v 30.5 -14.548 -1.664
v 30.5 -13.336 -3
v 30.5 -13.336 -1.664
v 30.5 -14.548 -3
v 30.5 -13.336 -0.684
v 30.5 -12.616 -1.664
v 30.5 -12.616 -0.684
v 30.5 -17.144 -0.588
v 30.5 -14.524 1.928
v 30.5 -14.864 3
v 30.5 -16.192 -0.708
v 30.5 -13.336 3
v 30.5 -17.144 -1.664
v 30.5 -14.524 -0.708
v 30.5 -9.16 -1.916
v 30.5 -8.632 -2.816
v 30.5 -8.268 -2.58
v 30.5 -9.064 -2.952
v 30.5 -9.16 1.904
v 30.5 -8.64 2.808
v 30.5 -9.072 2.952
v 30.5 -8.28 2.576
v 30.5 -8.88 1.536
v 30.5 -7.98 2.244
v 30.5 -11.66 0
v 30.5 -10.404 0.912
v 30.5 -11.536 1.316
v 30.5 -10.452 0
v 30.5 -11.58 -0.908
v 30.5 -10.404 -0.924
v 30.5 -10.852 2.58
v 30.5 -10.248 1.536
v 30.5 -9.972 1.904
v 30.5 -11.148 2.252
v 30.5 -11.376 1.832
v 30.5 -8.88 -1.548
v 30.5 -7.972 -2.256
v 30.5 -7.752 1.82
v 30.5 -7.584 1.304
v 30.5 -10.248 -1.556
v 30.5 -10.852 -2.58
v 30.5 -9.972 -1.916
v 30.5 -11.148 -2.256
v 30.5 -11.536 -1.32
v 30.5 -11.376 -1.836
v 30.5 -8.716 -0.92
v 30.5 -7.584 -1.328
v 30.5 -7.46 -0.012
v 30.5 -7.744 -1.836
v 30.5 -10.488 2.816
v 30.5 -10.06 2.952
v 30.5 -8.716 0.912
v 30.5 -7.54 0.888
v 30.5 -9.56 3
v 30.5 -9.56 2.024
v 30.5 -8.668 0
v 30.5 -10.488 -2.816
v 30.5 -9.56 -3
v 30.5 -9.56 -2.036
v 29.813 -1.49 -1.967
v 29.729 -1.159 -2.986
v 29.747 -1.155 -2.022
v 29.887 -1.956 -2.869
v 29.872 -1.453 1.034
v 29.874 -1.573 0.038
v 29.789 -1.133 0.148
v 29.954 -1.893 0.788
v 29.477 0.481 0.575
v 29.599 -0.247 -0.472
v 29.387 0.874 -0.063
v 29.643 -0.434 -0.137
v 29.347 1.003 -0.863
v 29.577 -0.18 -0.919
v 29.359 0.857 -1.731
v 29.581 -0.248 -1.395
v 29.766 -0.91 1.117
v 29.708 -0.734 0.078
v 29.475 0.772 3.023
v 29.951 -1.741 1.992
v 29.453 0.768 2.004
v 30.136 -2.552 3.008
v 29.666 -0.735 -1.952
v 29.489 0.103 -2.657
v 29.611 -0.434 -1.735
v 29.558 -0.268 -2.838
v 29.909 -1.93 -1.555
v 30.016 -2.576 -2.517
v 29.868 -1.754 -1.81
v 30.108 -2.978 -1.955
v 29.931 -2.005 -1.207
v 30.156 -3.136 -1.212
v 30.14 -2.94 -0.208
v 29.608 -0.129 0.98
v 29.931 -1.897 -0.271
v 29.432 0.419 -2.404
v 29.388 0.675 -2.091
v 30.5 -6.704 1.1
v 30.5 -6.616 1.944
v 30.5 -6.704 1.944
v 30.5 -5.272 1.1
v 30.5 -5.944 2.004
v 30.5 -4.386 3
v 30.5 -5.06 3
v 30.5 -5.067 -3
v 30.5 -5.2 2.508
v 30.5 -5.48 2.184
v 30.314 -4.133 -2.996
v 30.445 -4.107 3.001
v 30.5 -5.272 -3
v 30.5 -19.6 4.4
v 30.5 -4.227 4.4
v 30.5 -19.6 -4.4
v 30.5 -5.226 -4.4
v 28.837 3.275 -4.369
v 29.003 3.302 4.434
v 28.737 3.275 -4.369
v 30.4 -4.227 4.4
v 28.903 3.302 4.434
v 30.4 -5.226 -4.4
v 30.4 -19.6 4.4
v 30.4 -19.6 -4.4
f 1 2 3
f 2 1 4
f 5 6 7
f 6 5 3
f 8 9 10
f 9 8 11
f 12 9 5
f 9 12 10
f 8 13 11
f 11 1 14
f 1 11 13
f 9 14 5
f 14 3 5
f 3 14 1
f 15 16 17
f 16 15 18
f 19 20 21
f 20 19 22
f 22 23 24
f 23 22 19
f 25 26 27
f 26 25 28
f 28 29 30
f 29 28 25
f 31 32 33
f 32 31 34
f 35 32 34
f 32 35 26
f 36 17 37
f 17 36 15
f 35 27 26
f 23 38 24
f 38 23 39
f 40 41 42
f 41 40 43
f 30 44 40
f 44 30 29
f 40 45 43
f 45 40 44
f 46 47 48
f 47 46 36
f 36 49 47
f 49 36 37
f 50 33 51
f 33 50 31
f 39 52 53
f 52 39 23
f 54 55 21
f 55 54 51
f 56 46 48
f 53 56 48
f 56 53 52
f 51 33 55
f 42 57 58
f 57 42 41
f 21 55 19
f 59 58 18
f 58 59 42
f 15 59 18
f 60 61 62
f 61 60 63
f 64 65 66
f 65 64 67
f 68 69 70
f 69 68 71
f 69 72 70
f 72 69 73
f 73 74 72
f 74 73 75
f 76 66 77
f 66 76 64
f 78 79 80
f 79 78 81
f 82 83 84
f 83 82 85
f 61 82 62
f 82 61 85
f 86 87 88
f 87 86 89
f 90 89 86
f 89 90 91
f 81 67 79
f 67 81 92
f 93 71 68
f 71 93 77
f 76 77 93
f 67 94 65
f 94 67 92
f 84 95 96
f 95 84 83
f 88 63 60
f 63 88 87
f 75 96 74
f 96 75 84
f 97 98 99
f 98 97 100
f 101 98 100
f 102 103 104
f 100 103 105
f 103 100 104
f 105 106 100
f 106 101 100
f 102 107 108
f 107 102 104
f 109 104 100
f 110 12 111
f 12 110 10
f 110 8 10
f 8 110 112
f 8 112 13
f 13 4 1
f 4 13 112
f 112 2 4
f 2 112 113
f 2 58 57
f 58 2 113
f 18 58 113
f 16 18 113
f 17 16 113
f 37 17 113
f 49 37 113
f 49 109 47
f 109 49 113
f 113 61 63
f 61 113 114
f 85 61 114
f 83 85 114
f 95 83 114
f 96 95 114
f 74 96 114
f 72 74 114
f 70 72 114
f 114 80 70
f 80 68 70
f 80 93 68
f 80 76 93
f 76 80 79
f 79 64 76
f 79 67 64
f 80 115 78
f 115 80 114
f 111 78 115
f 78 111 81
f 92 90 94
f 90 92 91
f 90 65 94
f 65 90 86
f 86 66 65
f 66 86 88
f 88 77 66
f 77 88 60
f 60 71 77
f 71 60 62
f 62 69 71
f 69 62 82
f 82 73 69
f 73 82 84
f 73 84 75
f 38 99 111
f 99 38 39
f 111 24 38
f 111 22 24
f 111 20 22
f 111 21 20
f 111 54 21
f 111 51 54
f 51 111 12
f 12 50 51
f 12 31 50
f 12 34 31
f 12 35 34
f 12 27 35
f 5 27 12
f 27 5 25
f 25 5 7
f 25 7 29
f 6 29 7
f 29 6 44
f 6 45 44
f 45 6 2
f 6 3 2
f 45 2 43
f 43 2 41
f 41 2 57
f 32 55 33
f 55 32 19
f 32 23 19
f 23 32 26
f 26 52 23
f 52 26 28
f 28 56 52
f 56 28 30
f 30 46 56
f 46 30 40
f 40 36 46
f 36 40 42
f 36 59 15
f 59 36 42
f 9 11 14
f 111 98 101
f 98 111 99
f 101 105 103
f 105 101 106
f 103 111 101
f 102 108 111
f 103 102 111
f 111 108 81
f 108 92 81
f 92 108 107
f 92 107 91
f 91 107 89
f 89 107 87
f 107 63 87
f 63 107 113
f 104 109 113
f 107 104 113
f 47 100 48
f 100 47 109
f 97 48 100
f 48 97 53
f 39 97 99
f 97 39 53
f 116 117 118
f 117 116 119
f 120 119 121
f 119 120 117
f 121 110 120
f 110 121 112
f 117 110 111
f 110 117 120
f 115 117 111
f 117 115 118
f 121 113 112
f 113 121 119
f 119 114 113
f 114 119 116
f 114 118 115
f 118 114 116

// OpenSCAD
use <../lib.scad>
function ldraw_lib__194295bc01() = [
// 0 Sticker  1.1 x  2.9 with White "4015" on Transparent Background (Formed for Boat Stern Left Side)
// 0 Name: 194295bc01.dat
// 0 Author: Takeshi Takahashi [RainbowDolphin]
// 0 !LDRAW_ORG Part UPDATE 2024-04
// 0 !LICENSE Licensed under CC BY 4.0 : see CAreadme.txt
// 
// 0 BFC CERTIFY CCW
  [0,"BFC","CERTIFY"],
  [0,"BFC","CCW"],
// 
// 0 !KEYWORDS Bricklink 4015stk01, Brickowl 526213, Freighter, Rebrickable 194295
// 0 !KEYWORDS Set 4015
// 
// 0 !HISTORY 2024-05-28 [OrionP] Official Update 2024-04
// 
// 
// 0 BFC NOCLIP
  [0,"BFC","NOCLIP"],
// 4 15 76.25 7.5 -36.37 76.25 7.5 -33.34 76.25 4.16 -33.34 76.25 4.16 -36.37
  [4,15,76.25,7.5,-36.37,76.25,7.5,-33.34,76.25,4.16,-33.34,76.25,4.16,-36.37],
// 4 15 76.25 1.71 -33.34 76.25 4.16 -33.34 76.25 4.16 -31.54 76.25 1.71 -31.54
  [4,15,76.25,1.71,-33.34,76.25,4.16,-33.34,76.25,4.16,-31.54,76.25,1.71,-31.54],
// 4 15 76.25 1.77 -40.48 76.25 -4.82 -36.309 76.25 -7.5 -37.16 76.25 1.47 -42.86
  [4,15,76.25,1.77,-40.48,76.25,-4.82,-36.309,76.25,-7.5,-37.16,76.25,1.47,-42.86],
// 4 15 76.25 -7.5 -33.34 76.25 -7.5 -37.16 76.25 -4.82 -36.309 76.25 1.71 -33.34
  [4,15,76.25,-7.5,-33.34,76.25,-7.5,-37.16,76.25,-4.82,-36.309,76.25,1.71,-33.34],
// 3 15 76.25 1.47 -42.86 76.25 4.16 -42.86 76.25 1.77 -40.48
  [3,15,76.25,1.47,-42.86,76.25,4.16,-42.86,76.25,1.77,-40.48],
// 4 15 76.25 1.77 -36.309 76.25 1.77 -40.48 76.25 4.16 -42.86 76.25 4.16 -36.37
  [4,15,76.25,1.77,-36.309,76.25,1.77,-40.48,76.25,4.16,-42.86,76.25,4.16,-36.37],
// 3 15 76.25 -4.82 -36.309 76.25 1.77 -36.309 76.25 1.71 -33.34
  [3,15,76.25,-4.82,-36.309,76.25,1.77,-36.309,76.25,1.71,-33.34],
// 4 15 76.25 4.16 -36.37 76.25 4.16 -33.34 76.25 1.71 -33.34 76.25 1.77 -36.309
  [4,15,76.25,4.16,-36.37,76.25,4.16,-33.34,76.25,1.71,-33.34,76.25,1.77,-36.309],
// 4 15 76.25 6.45 -20.67 76.25 4.79 -22.9 76.25 7.38 -22.66 76.25 7.04 -21.58
  [4,15,76.25,6.45,-20.67,76.25,4.79,-22.9,76.25,7.38,-22.66,76.25,7.04,-21.58],
// 4 15 76.25 -7.38 -22.68 76.25 -4.76 -22.9 76.25 -6.44 -20.7 76.25 -7.02 -21.6
  [4,15,76.25,-7.38,-22.68,76.25,-4.76,-22.9,76.25,-6.44,-20.7,76.25,-7.02,-21.6],
// 4 15 76.25 -5.61 -19.95 76.25 -6.44 -20.7 76.25 -4.76 -22.9 76.25 -3.84 -22.2
  [4,15,76.25,-5.61,-19.95,76.25,-6.44,-20.7,76.25,-4.76,-22.9,76.25,-3.84,-22.2],
// 4 15 76.25 -3.29 -28.84 76.25 0 -29.15 76.25 0 -26.13 76.25 -2.28 -26.01
  [4,15,76.25,-3.29,-28.84,76.25,0,-29.15,76.25,0,-26.13,76.25,-2.28,-26.01],
// 4 15 76.25 0 -29.15 76.25 2.27 -28.95 76.25 2.31 -26.01 76.25 0 -26.13
  [4,15,76.25,0,-29.15,76.25,2.27,-28.95,76.25,2.31,-26.01,76.25,0,-26.13],
// 4 15 76.25 -4.76 -24.93 76.25 -6.45 -27.13 76.25 -5.63 -27.87 76.25 -3.84 -25.62
  [4,15,76.25,-4.76,-24.93,76.25,-6.45,-27.13,76.25,-5.63,-27.87,76.25,-3.84,-25.62],
// 4 15 76.25 -3.84 -25.62 76.25 -5.63 -27.87 76.25 -4.58 -28.44 76.25 -2.28 -26.01
  [4,15,76.25,-3.84,-25.62,76.25,-5.63,-27.87,76.25,-4.58,-28.44,76.25,-2.28,-26.01],
// 4 15 76.25 4.79 -22.9 76.25 6.45 -20.67 76.25 5.64 -19.93 76.25 3.87 -22.2
  [4,15,76.25,4.79,-22.9,76.25,6.45,-20.67,76.25,5.64,-19.93,76.25,3.87,-22.2],
// 3 15 76.25 -4.58 -28.44 76.25 -3.29 -28.84 76.25 -2.28 -26.01
  [3,15,76.25,-4.58,-28.44,76.25,-3.29,-28.84,76.25,-2.28,-26.01],
// 4 15 76.25 -3.26 -18.96 76.25 -4.55 -19.38 76.25 -5.61 -19.95 76.25 -3.84 -22.2
  [4,15,76.25,-3.26,-18.96,76.25,-4.55,-19.38,76.25,-5.61,-19.95,76.25,-3.84,-22.2],
// 4 15 76.25 4.79 -24.93 76.25 3.89 -25.62 76.25 5.64 -27.87 76.25 6.45 -27.13
  [4,15,76.25,4.79,-24.93,76.25,3.89,-25.62,76.25,5.64,-27.87,76.25,6.45,-27.13],
// 4 15 76.25 2.27 -28.95 76.25 3.3 -28.84 76.25 3.89 -25.62 76.25 2.31 -26.01
  [4,15,76.25,2.27,-28.95,76.25,3.3,-28.84,76.25,3.89,-25.62,76.25,2.31,-26.01],
// 4 15 76.25 3.3 -28.84 76.25 4.59 -28.44 76.25 5.64 -27.87 76.25 3.89 -25.62
  [4,15,76.25,3.3,-28.84,76.25,4.59,-28.44,76.25,5.64,-27.87,76.25,3.89,-25.62],
// 4 15 76.25 .03 -18.65 76.25 2.3 -21.79 76.25 3.87 -22.2 76.25 3.32 -18.96
  [4,15,76.25,.03,-18.65,76.25,2.3,-21.79,76.25,3.87,-22.2,76.25,3.32,-18.96],
// 4 15 76.25 5.64 -19.93 76.25 4.59 -19.36 76.25 3.32 -18.96 76.25 3.87 -22.2
  [4,15,76.25,5.64,-19.93,76.25,4.59,-19.36,76.25,3.32,-18.96,76.25,3.87,-22.2],
// 4 15 76.25 -6.45 -27.13 76.25 -4.76 -24.93 76.25 -7.38 -25.15 76.25 -7.04 -26.22
  [4,15,76.25,-6.45,-27.13,76.25,-4.76,-24.93,76.25,-7.38,-25.15,76.25,-7.04,-26.22],
// 4 15 76.25 -3.84 -22.2 76.25 -2.28 -21.79 76.25 -2.22 -18.85 76.25 -3.26 -18.96
  [4,15,76.25,-3.84,-22.2,76.25,-2.28,-21.79,76.25,-2.22,-18.85,76.25,-3.26,-18.96],
// 4 15 76.25 -7.38 -22.68 76.25 -7.5 -23.9 76.25 -7.38 -25.15 76.25 -5.06 -23.9
  [4,15,76.25,-7.38,-22.68,76.25,-7.5,-23.9,76.25,-7.38,-25.15,76.25,-5.06,-23.9],
// 3 15 76.25 0 -21.67 76.25 2.3 -21.79 76.25 .03 -18.65
  [3,15,76.25,0,-21.67,76.25,2.3,-21.79,76.25,.03,-18.65],
// 4 15 76.25 -2.28 -21.79 76.25 0 -21.67 76.25 .03 -18.65 76.25 -2.22 -18.85
  [4,15,76.25,-2.28,-21.79,76.25,0,-21.67,76.25,.03,-18.65,76.25,-2.22,-18.85],
// 3 15 76.25 -7.38 -25.15 76.25 -4.76 -24.93 76.25 -5.06 -23.9
  [3,15,76.25,-7.38,-25.15,76.25,-4.76,-24.93,76.25,-5.06,-23.9],
// 4 15 76.25 6.45 -27.13 76.25 7.04 -26.22 76.25 7.5 -23.9 76.25 4.79 -24.93
  [4,15,76.25,6.45,-27.13,76.25,7.04,-26.22,76.25,7.5,-23.9,76.25,4.79,-24.93],
// 3 15 76.25 -7.38 -22.68 76.25 -5.06 -23.9 76.25 -4.76 -22.9
  [3,15,76.25,-7.38,-22.68,76.25,-5.06,-23.9,76.25,-4.76,-22.9],
// 4 15 76.25 4.79 -24.93 76.25 7.5 -23.9 76.25 7.38 -22.66 76.25 5.09 -23.9
  [4,15,76.25,4.79,-24.93,76.25,7.5,-23.9,76.25,7.38,-22.66,76.25,5.09,-23.9],
// 3 15 76.25 4.79 -22.9 76.25 5.09 -23.9 76.25 7.38 -22.66
  [3,15,76.25,4.79,-22.9,76.25,5.09,-23.9,76.25,7.38,-22.66],
// 4 15 74.7179 7.1715 -4.8893 74.3232 7.4641 -2.8964 74.3664 5.0549 -2.888 74.5325 4.918 -3.7255
  [4,15,74.7179,7.1715,-4.8893,74.3232,7.4641,-2.8964,74.3664,5.0549,-2.888,74.5325,4.918,-3.7255],
// 4 15 74.8855 -1.9708 -4.7314 74.6842 -.0954 -3.9324 74.4719 -.3702 -2.8336 74.6807 -2.5854 -3.6321
  [4,15,74.8855,-1.9708,-4.7314,74.6842,-.0954,-3.9324,74.4719,-.3702,-2.8336,74.6807,-2.5854,-3.6321],
// 4 15 74.1083 .3416 -1.0859 73.9964 1.1791 -.6182 73.4663 .1582 2.1862 73.6936 -1.4377 1.2016
  [4,15,74.1083,.3416,-1.0859,73.9964,1.1791,-.6182,73.4663,.1582,2.1862,73.6936,-1.4377,1.2016],
// 4 15 73.4663 .1582 2.1862 73.9964 1.1791 -.6182 73.9416 2.297 -.4509 73.3665 2.1563 2.5067
  [4,15,73.4663,.1582,2.1862,73.9964,1.1791,-.6182,73.9416,2.297,-.4509,73.3665,2.1563,2.5067],
// 4 15 73.9523 3.4872 -.6188 73.3972 4.3269 2.1427 73.3665 2.1563 2.5067 73.9416 2.297 -.4509
  [4,15,73.9523,3.4872,-.6188,73.3972,4.3269,2.1427,73.3665,2.1563,2.5067,73.9416,2.297,-.4509],
// 4 15 74.6807 -2.5854 -3.6321 74.4719 -.3702 -2.8336 74.2691 -.1947 -1.8339 74.4155 -2.7914 -2.2748
  [4,15,74.6807,-2.5854,-3.6321,74.4719,-.3702,-2.8336,74.2691,-.1947,-1.8339,74.4155,-2.7914,-2.2748],
// 4 15 75.3389 -7.5206 -6.3812 74.8781 -4.981 -4.3528 73.6315 -5.0091 1.9193 73.6869 -7.5579 1.9303
  [4,15,75.3389,-7.5206,-6.3812,74.8781,-4.981,-4.3528,73.6315,-5.0091,1.9193,73.6869,-7.5579,1.9303],
// 4 15 73.7226 6.6429 .2563 74.0273 4.3386 -1.0842 74.1644 4.8812 -1.8374 73.8951 7.0962 -.67
  [4,15,73.7226,6.6429,.2563,74.0273,4.3386,-1.0842,74.1644,4.8812,-1.8374,73.8951,7.0962,-.67],
// 4 15 74.3664 5.0549 -2.888 74.3232 7.4641 -2.8964 73.8951 7.0962 -.67 74.1644 4.8812 -1.8374
  [4,15,74.3664,5.0549,-2.888,74.3232,7.4641,-2.8964,73.8951,7.0962,-.67,74.1644,4.8812,-1.8374],
// 4 15 74.6698 4.5243 -4.3843 74.7716 3.8866 -4.824 75.2702 4.8879 -7.4448 75.0388 6.2927 -6.4409
  [4,15,74.6698,4.5243,-4.3843,74.7716,3.8866,-4.824,75.2702,4.8879,-7.4448,75.0388,6.2927,-6.4409],
// 4 15 75.3909 3.0306 -7.8408 75.2702 4.8879 -7.4448 74.7716 3.8866 -4.824 74.8287 3.0179 -5.0126
  [4,15,75.3909,3.0306,-7.8408,75.2702,4.8879,-7.4448,74.7716,3.8866,-4.824,74.8287,3.0179,-5.0126],
// 4 15 74.8781 -4.981 -4.3528 75.3389 -7.5206 -6.3812 75.3498 .5197 -7.349 74.8855 -1.9708 -4.7314
  [4,15,74.8781,-4.981,-4.3528,75.3389,-7.5206,-6.3812,75.3498,.5197,-7.349,74.8855,-1.9708,-4.7314],
// 4 15 73.6936 -1.4377 1.2016 74.0197 -2.4504 -.3235 74.2691 -.1947 -1.8339 74.1083 .3416 -1.0859
  [4,15,73.6936,-1.4377,1.2016,74.0197,-2.4504,-.3235,74.2691,-.1947,-1.8339,74.1083,.3416,-1.0859],
// 3 15 74.4155 -2.7914 -2.2748 74.2691 -.1947 -1.8339 74.0197 -2.4504 -.3235
  [3,15,74.4155,-2.7914,-2.2748,74.2691,-.1947,-1.8339,74.0197,-2.4504,-.3235],
// 4 15 75.3498 .5197 -7.349 74.8279 .6779 -4.7428 74.6842 -.0954 -3.9324 74.8855 -1.9708 -4.7314
  [4,15,75.3498,.5197,-7.349,74.8279,.6779,-4.7428,74.6842,-.0954,-3.9324,74.8855,-1.9708,-4.7314],
// 4 15 73.4695 5.2282 1.6868 74.0273 4.3386 -1.0842 73.7226 6.6429 .2563 73.5796 6.0103 1.0484
  [4,15,73.4695,5.2282,1.6868,74.0273,4.3386,-1.0842,73.7226,6.6429,.2563,73.5796,6.0103,1.0484],
// 4 15 75.0388 6.2927 -6.4409 74.7179 7.1715 -4.8893 74.5325 4.918 -3.7255 74.6698 4.5243 -4.3843
  [4,15,75.0388,6.2927,-6.4409,74.7179,7.1715,-4.8893,74.5325,4.918,-3.7255,74.6698,4.5243,-4.3843],
// 4 15 73.3972 4.3269 2.1427 73.9523 3.4872 -.6188 74.0273 4.3386 -1.0842 73.4695 5.2282 1.6868
  [4,15,73.3972,4.3269,2.1427,73.9523,3.4872,-.6188,74.0273,4.3386,-1.0842,73.4695,5.2282,1.6868],
// 4 15 76.25 -4.86 -16.54 76.25 -4.86 -16.76 76.25 -2.75 -16.76 76.25 -2.75 -13.18
  [4,15,76.25,-4.86,-16.54,76.25,-4.86,-16.76,76.25,-2.75,-16.76,76.25,-2.75,-13.18],
// 3 15 76.25 -5.01 -14.86 76.25 -4.86 -16.54 76.25 -2.75 -13.18
  [3,15,76.25,-5.01,-14.86,76.25,-4.86,-16.54,76.25,-2.75,-13.18],
// 3 15 76.25 -7.5 -10.9652 76.25 -7.5 -12.65 76.25 7.5 -12.6684
  [3,15,76.25,-7.5,-10.9652,76.25,-7.5,-12.65,76.25,7.5,-12.6684],
// 4 15 76.25 -7.5 -12.65 76.25 -6.27 -13 76.25 -2.75 -13.18 76.25 7.5 -12.6684
  [4,15,76.25,-7.5,-12.65,76.25,-6.27,-13,76.25,-2.75,-13.18,76.25,7.5,-12.6684],
// 3 15 76.25 -6.27 -13 76.25 -5.46 -13.7 76.25 -2.75 -13.18
  [3,15,76.25,-6.27,-13,76.25,-5.46,-13.7,76.25,-2.75,-13.18],
// 3 15 76.25 -5.46 -13.7 76.25 -5.01 -14.86 76.25 -2.75 -13.18
  [3,15,76.25,-5.46,-13.7,76.25,-5.01,-14.86,76.25,-2.75,-13.18],
// 4 15 76.1113 -7.5031 -10.2676 76.25 -7.5 -10.9652 76.25 7.5 -12.6684 75.7857 7.4895 -10.3323
  [4,15,76.1113,-7.5031,-10.2676,76.25,-7.5,-10.9652,76.25,7.5,-12.6684,75.7857,7.4895,-10.3323],
// 3 15 76.25 7.5 -13.18 76.25 7.5 -12.6684 76.25 -2.75 -13.18
  [3,15,76.25,7.5,-13.18,76.25,7.5,-12.6684,76.25,-2.75,-13.18],
// 0 BFC CLIP
  [0,"BFC","CLIP"],
// 4 16 76.25 -7.5 -33.34 76.25 -11 -10.5677 76.25 -11 -49 76.25 -7.5 -37.16
  [4,16,76.25,-7.5,-33.34,76.25,-11,-10.5677,76.25,-11,-49,76.25,-7.5,-37.16],
// 4 16 76.25 1.47 -42.86 76.25 -7.5 -37.16 76.25 -11 -49 76.25 11 -49
  [4,16,76.25,1.47,-42.86,76.25,-7.5,-37.16,76.25,-11,-49,76.25,11,-49],
// 3 16 76.25 1.47 -42.86 76.25 11 -49 76.25 4.16 -42.86
  [3,16,76.25,1.47,-42.86,76.25,11,-49,76.25,4.16,-42.86],
// 4 16 76.25 4.16 -36.37 76.25 4.16 -42.86 76.25 11 -49 76.25 7.5 -36.37
  [4,16,76.25,4.16,-36.37,76.25,4.16,-42.86,76.25,11,-49,76.25,7.5,-36.37],
// 4 16 76.25 7.5 -33.34 76.25 7.5 -36.37 76.25 11 -49 76.25 11 -13.0658
  [4,16,76.25,7.5,-33.34,76.25,7.5,-36.37,76.25,11,-49,76.25,11,-13.0658],
// 4 16 76.25 7.5 -33.34 76.25 11 -13.0658 76.25 7.5 -23.9 76.25 7.04 -26.22
  [4,16,76.25,7.5,-33.34,76.25,11,-13.0658,76.25,7.5,-23.9,76.25,7.04,-26.22],
// 3 16 76.25 7.38 -22.66 76.25 7.5 -23.9 76.25 11 -13.0658
  [3,16,76.25,7.38,-22.66,76.25,7.5,-23.9,76.25,11,-13.0658],
// 3 16 76.25 7.04 -21.58 76.25 7.38 -22.66 76.25 11 -13.0658
  [3,16,76.25,7.04,-21.58,76.25,7.38,-22.66,76.25,11,-13.0658],
// 3 16 76.25 6.45 -20.67 76.25 7.04 -21.58 76.25 11 -13.0658
  [3,16,76.25,6.45,-20.67,76.25,7.04,-21.58,76.25,11,-13.0658],
// 3 16 76.25 5.64 -19.93 76.25 6.45 -20.67 76.25 11 -13.0658
  [3,16,76.25,5.64,-19.93,76.25,6.45,-20.67,76.25,11,-13.0658],
// 3 16 76.25 4.59 -19.36 76.25 5.64 -19.93 76.25 11 -13.0658
  [3,16,76.25,4.59,-19.36,76.25,5.64,-19.93,76.25,11,-13.0658],
// 4 16 76.25 3.32 -18.96 76.25 4.59 -19.36 76.25 11 -13.0658 76.25 7.5 -13.18
  [4,16,76.25,3.32,-18.96,76.25,4.59,-19.36,76.25,11,-13.0658,76.25,7.5,-13.18],
// 4 16 74.3232 7.4641 -2.8964 74.7179 7.1715 -4.8893 76.25 11 -13.0658 72.0935 10.9226 8.188
  [4,16,74.3232,7.4641,-2.8964,74.7179,7.1715,-4.8893,76.25,11,-13.0658,72.0935,10.9226,8.188],
// 3 16 73.8951 7.0962 -.67 74.3232 7.4641 -2.8964 72.0935 10.9226 8.188
  [3,16,73.8951,7.0962,-.67,74.3232,7.4641,-2.8964,72.0935,10.9226,8.188],
// 3 16 73.7226 6.6429 .2563 73.8951 7.0962 -.67 72.0935 10.9226 8.188
  [3,16,73.7226,6.6429,.2563,73.8951,7.0962,-.67,72.0935,10.9226,8.188],
// 3 16 73.5796 6.0103 1.0484 73.7226 6.6429 .2563 72.0935 10.9226 8.188
  [3,16,73.5796,6.0103,1.0484,73.7226,6.6429,.2563,72.0935,10.9226,8.188],
// 3 16 73.4695 5.2282 1.6868 73.5796 6.0103 1.0484 72.0935 10.9226 8.188
  [3,16,73.4695,5.2282,1.6868,73.5796,6.0103,1.0484,72.0935,10.9226,8.188],
// 3 16 73.3972 4.3269 2.1427 73.4695 5.2282 1.6868 72.0935 10.9226 8.188
  [3,16,73.3972,4.3269,2.1427,73.4695,5.2282,1.6868,72.0935,10.9226,8.188],
// 3 16 73.3665 2.1563 2.5067 73.3972 4.3269 2.1427 72.0935 10.9226 8.188
  [3,16,73.3665,2.1563,2.5067,73.3972,4.3269,2.1427,72.0935,10.9226,8.188],
// 3 16 73.4663 .1582 2.1862 73.3665 2.1563 2.5067 72.0935 10.9226 8.188
  [3,16,73.4663,.1582,2.1862,73.3665,2.1563,2.5067,72.0935,10.9226,8.188],
// 3 16 72.0935 10.9226 8.188 73.6315 -5.0091 1.9193 73.4663 .1582 2.1862
  [3,16,72.0935,10.9226,8.188,73.6315,-5.0091,1.9193,73.4663,.1582,2.1862],
// 3 16 73.6315 -5.0091 1.9193 73.6936 -1.4377 1.2016 73.4663 .1582 2.1862
  [3,16,73.6315,-5.0091,1.9193,73.6936,-1.4377,1.2016,73.4663,.1582,2.1862],
// 3 16 73.6315 -5.0091 1.9193 74.0197 -2.4504 -.3235 73.6936 -1.4377 1.2016
  [3,16,73.6315,-5.0091,1.9193,74.0197,-2.4504,-.3235,73.6936,-1.4377,1.2016],
// 4 16 74.4155 -2.7914 -2.2748 74.0197 -2.4504 -.3235 73.6315 -5.0091 1.9193 74.8781 -4.981 -4.3528
  [4,16,74.4155,-2.7914,-2.2748,74.0197,-2.4504,-.3235,73.6315,-5.0091,1.9193,74.8781,-4.981,-4.3528],
// 3 16 74.8781 -4.981 -4.3528 74.6807 -2.5854 -3.6321 74.4155 -2.7914 -2.2748
  [3,16,74.8781,-4.981,-4.3528,74.6807,-2.5854,-3.6321,74.4155,-2.7914,-2.2748],
// 3 16 74.8781 -4.981 -4.3528 74.8855 -1.9708 -4.7314 74.6807 -2.5854 -3.6321
  [3,16,74.8781,-4.981,-4.3528,74.8855,-1.9708,-4.7314,74.6807,-2.5854,-3.6321],
// 4 16 73.6315 -5.0091 1.9193 72.0935 10.9226 8.188 72.5085 -11.0845 8.256 73.6869 -7.5579 1.9303
  [4,16,73.6315,-5.0091,1.9193,72.0935,10.9226,8.188,72.5085,-11.0845,8.256,73.6869,-7.5579,1.9303],
// 4 16 75.3389 -7.5206 -6.3812 73.6869 -7.5579 1.9303 72.5085 -11.0845 8.256 76.25 -11 -10.5677
  [4,16,75.3389,-7.5206,-6.3812,73.6869,-7.5579,1.9303,72.5085,-11.0845,8.256,76.25,-11,-10.5677],
// 4 16 74.8279 .6779 -4.7428 75.3498 .5197 -7.349 75.3909 3.0306 -7.8408 74.8287 3.0179 -5.0126
  [4,16,74.8279,.6779,-4.7428,75.3498,.5197,-7.349,75.3909,3.0306,-7.8408,74.8287,3.0179,-5.0126],
// 4 16 74.6842 -.0954 -3.9324 74.8279 .6779 -4.7428 74.8287 3.0179 -5.0126 74.7716 3.8866 -4.824
  [4,16,74.6842,-.0954,-3.9324,74.8279,.6779,-4.7428,74.8287,3.0179,-5.0126,74.7716,3.8866,-4.824],
// 4 16 74.4719 -.3702 -2.8336 74.6842 -.0954 -3.9324 74.7716 3.8866 -4.824 74.6698 4.5243 -4.3843
  [4,16,74.4719,-.3702,-2.8336,74.6842,-.0954,-3.9324,74.7716,3.8866,-4.824,74.6698,4.5243,-4.3843],
// 4 16 74.2691 -.1947 -1.8339 74.4719 -.3702 -2.8336 74.6698 4.5243 -4.3843 74.5325 4.918 -3.7255
  [4,16,74.2691,-.1947,-1.8339,74.4719,-.3702,-2.8336,74.6698,4.5243,-4.3843,74.5325,4.918,-3.7255],
// 4 16 74.1083 .3416 -1.0859 74.2691 -.1947 -1.8339 74.5325 4.918 -3.7255 74.3664 5.0549 -2.888
  [4,16,74.1083,.3416,-1.0859,74.2691,-.1947,-1.8339,74.5325,4.918,-3.7255,74.3664,5.0549,-2.888],
// 4 16 73.9964 1.1791 -.6182 74.1083 .3416 -1.0859 74.3664 5.0549 -2.888 74.1644 4.8812 -1.8374
  [4,16,73.9964,1.1791,-.6182,74.1083,.3416,-1.0859,74.3664,5.0549,-2.888,74.1644,4.8812,-1.8374],
// 4 16 73.9416 2.297 -.4509 73.9964 1.1791 -.6182 74.1644 4.8812 -1.8374 74.0273 4.3386 -1.0842
  [4,16,73.9416,2.297,-.4509,73.9964,1.1791,-.6182,74.1644,4.8812,-1.8374,74.0273,4.3386,-1.0842],
// 3 16 73.9416 2.297 -.4509 74.0273 4.3386 -1.0842 73.9523 3.4872 -.6188
  [3,16,73.9416,2.297,-.4509,74.0273,4.3386,-1.0842,73.9523,3.4872,-.6188],
// 4 16 76.25 -11 -10.5677 76.25 -4.55 -19.38 76.25 -3.26 -18.96 76.25 -4.86 -16.76
  [4,16,76.25,-11,-10.5677,76.25,-4.55,-19.38,76.25,-3.26,-18.96,76.25,-4.86,-16.76],
// 3 16 76.25 -11 -10.5677 76.25 -5.61 -19.95 76.25 -4.55 -19.38
  [3,16,76.25,-11,-10.5677,76.25,-5.61,-19.95,76.25,-4.55,-19.38],
// 3 16 76.25 -11 -10.5677 76.25 -6.44 -20.7 76.25 -5.61 -19.95
  [3,16,76.25,-11,-10.5677,76.25,-6.44,-20.7,76.25,-5.61,-19.95],
// 3 16 76.25 -11 -10.5677 76.25 -7.02 -21.6 76.25 -6.44 -20.7
  [3,16,76.25,-11,-10.5677,76.25,-7.02,-21.6,76.25,-6.44,-20.7],
// 3 16 76.25 -11 -10.5677 76.25 -7.38 -22.68 76.25 -7.02 -21.6
  [3,16,76.25,-11,-10.5677,76.25,-7.38,-22.68,76.25,-7.02,-21.6],
// 3 16 76.25 -11 -10.5677 76.25 -7.5 -23.9 76.25 -7.38 -22.68
  [3,16,76.25,-11,-10.5677,76.25,-7.5,-23.9,76.25,-7.38,-22.68],
// 4 16 76.25 -7.38 -25.15 76.25 -7.5 -23.9 76.25 -11 -10.5677 76.25 -7.5 -33.34
  [4,16,76.25,-7.38,-25.15,76.25,-7.5,-23.9,76.25,-11,-10.5677,76.25,-7.5,-33.34],
// 3 16 76.25 -7.5 -33.34 76.25 -7.04 -26.22 76.25 -7.38 -25.15
  [3,16,76.25,-7.5,-33.34,76.25,-7.04,-26.22,76.25,-7.38,-25.15],
// 3 16 76.25 -7.5 -33.34 76.25 -6.45 -27.13 76.25 -7.04 -26.22
  [3,16,76.25,-7.5,-33.34,76.25,-6.45,-27.13,76.25,-7.04,-26.22],
// 3 16 76.25 -7.5 -33.34 76.25 -5.63 -27.87 76.25 -6.45 -27.13
  [3,16,76.25,-7.5,-33.34,76.25,-5.63,-27.87,76.25,-6.45,-27.13],
// 3 16 76.25 -7.5 -33.34 76.25 -4.58 -28.44 76.25 -5.63 -27.87
  [3,16,76.25,-7.5,-33.34,76.25,-4.58,-28.44,76.25,-5.63,-27.87],
// 3 16 76.25 -7.5 -33.34 76.25 -3.29 -28.84 76.25 -4.58 -28.44
  [3,16,76.25,-7.5,-33.34,76.25,-3.29,-28.84,76.25,-4.58,-28.44],
// 4 16 76.25 0 -29.15 76.25 -3.29 -28.84 76.25 -7.5 -33.34 76.25 1.71 -33.34
  [4,16,76.25,0,-29.15,76.25,-3.29,-28.84,76.25,-7.5,-33.34,76.25,1.71,-33.34],
// 3 16 76.25 0 -29.15 76.25 1.71 -33.34 76.25 1.71 -31.54
  [3,16,76.25,0,-29.15,76.25,1.71,-33.34,76.25,1.71,-31.54],
// 3 16 76.25 0 -29.15 76.25 1.71 -31.54 76.25 2.27 -28.95
  [3,16,76.25,0,-29.15,76.25,1.71,-31.54,76.25,2.27,-28.95],
// 4 16 76.25 3.3 -28.84 76.25 2.27 -28.95 76.25 1.71 -31.54 76.25 4.16 -31.54
  [4,16,76.25,3.3,-28.84,76.25,2.27,-28.95,76.25,1.71,-31.54,76.25,4.16,-31.54],
// 4 16 76.25 4.59 -28.44 76.25 3.3 -28.84 76.25 4.16 -31.54 76.25 7.5 -33.34
  [4,16,76.25,4.59,-28.44,76.25,3.3,-28.84,76.25,4.16,-31.54,76.25,7.5,-33.34],
// 3 16 76.25 4.16 -31.54 76.25 4.16 -33.34 76.25 7.5 -33.34
  [3,16,76.25,4.16,-31.54,76.25,4.16,-33.34,76.25,7.5,-33.34],
// 3 16 76.25 4.59 -28.44 76.25 7.5 -33.34 76.25 5.64 -27.87
  [3,16,76.25,4.59,-28.44,76.25,7.5,-33.34,76.25,5.64,-27.87],
// 3 16 76.25 5.64 -27.87 76.25 7.5 -33.34 76.25 6.45 -27.13
  [3,16,76.25,5.64,-27.87,76.25,7.5,-33.34,76.25,6.45,-27.13],
// 3 16 76.25 6.45 -27.13 76.25 7.5 -33.34 76.25 7.04 -26.22
  [3,16,76.25,6.45,-27.13,76.25,7.5,-33.34,76.25,7.04,-26.22],
// 4 16 76.25 -4.76 -22.9 76.25 -5.06 -23.9 76.25 -4.76 -24.93 76.25 -3.84 -25.62
  [4,16,76.25,-4.76,-22.9,76.25,-5.06,-23.9,76.25,-4.76,-24.93,76.25,-3.84,-25.62],
// 4 16 76.25 -3.84 -22.2 76.25 -4.76 -22.9 76.25 -3.84 -25.62 76.25 -2.28 -26.01
  [4,16,76.25,-3.84,-22.2,76.25,-4.76,-22.9,76.25,-3.84,-25.62,76.25,-2.28,-26.01],
// 4 16 76.25 -2.28 -21.79 76.25 -3.84 -22.2 76.25 -2.28 -26.01 76.25 0 -26.13
  [4,16,76.25,-2.28,-21.79,76.25,-3.84,-22.2,76.25,-2.28,-26.01,76.25,0,-26.13],
// 4 16 76.25 0 -21.67 76.25 -2.28 -21.79 76.25 0 -26.13 76.25 2.31 -26.01
  [4,16,76.25,0,-21.67,76.25,-2.28,-21.79,76.25,0,-26.13,76.25,2.31,-26.01],
// 4 16 76.25 2.3 -21.79 76.25 0 -21.67 76.25 2.31 -26.01 76.25 3.89 -25.62
  [4,16,76.25,2.3,-21.79,76.25,0,-21.67,76.25,2.31,-26.01,76.25,3.89,-25.62],
// 4 16 76.25 3.87 -22.2 76.25 2.3 -21.79 76.25 3.89 -25.62 76.25 4.79 -24.93
  [4,16,76.25,3.87,-22.2,76.25,2.3,-21.79,76.25,3.89,-25.62,76.25,4.79,-24.93],
// 4 16 76.25 4.79 -22.9 76.25 3.87 -22.2 76.25 4.79 -24.93 76.25 5.09 -23.9
  [4,16,76.25,4.79,-22.9,76.25,3.87,-22.2,76.25,4.79,-24.93,76.25,5.09,-23.9],
// 3 16 76.25 -4.82 -36.309 76.25 1.77 -40.48 76.25 1.77 -36.309
  [3,16,76.25,-4.82,-36.309,76.25,1.77,-40.48,76.25,1.77,-36.309],
// 4 16 76.25 -11 -10.5677 76.25 -4.86 -16.76 76.25 -4.86 -16.54 76.25 -5.01 -14.86
  [4,16,76.25,-11,-10.5677,76.25,-4.86,-16.76,76.25,-4.86,-16.54,76.25,-5.01,-14.86],
// 4 16 76.25 -5.46 -13.7 76.25 -6.27 -13 76.25 -7.5 -12.65 76.25 -5.01 -14.86
  [4,16,76.25,-5.46,-13.7,76.25,-6.27,-13,76.25,-7.5,-12.65,76.25,-5.01,-14.86],
// 3 16 76.25 -7.5 -12.65 76.25 -11 -10.5677 76.25 -5.01 -14.86
  [3,16,76.25,-7.5,-12.65,76.25,-11,-10.5677,76.25,-5.01,-14.86],
// 3 16 76.25 -7.5 -10.9652 76.1113 -7.5031 -10.2676 76.25 -11 -10.5677
  [3,16,76.25,-7.5,-10.9652,76.1113,-7.5031,-10.2676,76.25,-11,-10.5677],
// 3 16 76.25 -7.5 -12.65 76.25 -7.5 -10.9652 76.25 -11 -10.5677
  [3,16,76.25,-7.5,-12.65,76.25,-7.5,-10.9652,76.25,-11,-10.5677],
// 3 16 76.25 -11 -10.5677 76.1113 -7.5031 -10.2676 75.3389 -7.5206 -6.3812
  [3,16,76.25,-11,-10.5677,76.1113,-7.5031,-10.2676,75.3389,-7.5206,-6.3812],
// 4 16 75.3498 .5197 -7.349 75.3389 -7.5206 -6.3812 76.1113 -7.5031 -10.2676 75.7857 7.4895 -10.3323
  [4,16,75.3498,.5197,-7.349,75.3389,-7.5206,-6.3812,76.1113,-7.5031,-10.2676,75.7857,7.4895,-10.3323],
// 3 16 75.3498 .5197 -7.349 75.7857 7.4895 -10.3323 75.3909 3.0306 -7.8408
  [3,16,75.3498,.5197,-7.349,75.7857,7.4895,-10.3323,75.3909,3.0306,-7.8408],
// 3 16 75.3909 3.0306 -7.8408 75.7857 7.4895 -10.3323 75.2702 4.8879 -7.4448
  [3,16,75.3909,3.0306,-7.8408,75.7857,7.4895,-10.3323,75.2702,4.8879,-7.4448],
// 3 16 75.2702 4.8879 -7.4448 75.7857 7.4895 -10.3323 75.0388 6.2927 -6.4409
  [3,16,75.2702,4.8879,-7.4448,75.7857,7.4895,-10.3323,75.0388,6.2927,-6.4409],
// 4 16 74.7179 7.1715 -4.8893 75.0388 6.2927 -6.4409 75.7857 7.4895 -10.3323 76.25 11 -13.0658
  [4,16,74.7179,7.1715,-4.8893,75.0388,6.2927,-6.4409,75.7857,7.4895,-10.3323,76.25,11,-13.0658],
// 3 16 76.25 7.5 -12.6684 76.25 7.5 -13.18 76.25 11 -13.0658
  [3,16,76.25,7.5,-12.6684,76.25,7.5,-13.18,76.25,11,-13.0658],
// 3 16 75.7857 7.4895 -10.3323 76.25 7.5 -12.6684 76.25 11 -13.0658
  [3,16,75.7857,7.4895,-10.3323,76.25,7.5,-12.6684,76.25,11,-13.0658],
// 4 16 76.25 3.32 -18.96 76.25 7.5 -13.18 76.25 -2.75 -13.18 76.25 .03 -18.65
  [4,16,76.25,3.32,-18.96,76.25,7.5,-13.18,76.25,-2.75,-13.18,76.25,.03,-18.65],
// 4 16 76.25 .03 -18.65 76.25 -2.75 -13.18 76.25 -2.75 -16.76 76.25 -2.22 -18.85
  [4,16,76.25,.03,-18.65,76.25,-2.75,-13.18,76.25,-2.75,-16.76,76.25,-2.22,-18.85],
// 4 16 76.25 -2.22 -18.85 76.25 -2.75 -16.76 76.25 -4.86 -16.76 76.25 -3.26 -18.96
  [4,16,76.25,-2.22,-18.85,76.25,-2.75,-16.76,76.25,-4.86,-16.76,76.25,-3.26,-18.96],
// 4 16 71.8435 10.9226 8.188 76 11 -13.0658 76 -11 -10.5677 72.2585 -11.0845 8.256
  [4,16,71.8435,10.9226,8.188,76,11,-13.0658,76,-11,-10.5677,72.2585,-11.0845,8.256],
// 4 16 76 -11 -49 76 -11 -10.5677 76 11 -13.0658 76 11 -49
  [4,16,76,-11,-49,76,-11,-10.5677,76,11,-13.0658,76,11,-49],
// 4 16 76.25 11 -49 76.25 -11 -49 76 -11 -49 76 11 -49
  [4,16,76.25,11,-49,76.25,-11,-49,76,-11,-49,76,11,-49],
// 4 16 76 -11 -10.5677 76 -11 -49 76.25 -11 -49 76.25 -11 -10.5677
  [4,16,76,-11,-10.5677,76,-11,-49,76.25,-11,-49,76.25,-11,-10.5677],
// 4 16 72.2585 -11.0845 8.256 76 -11 -10.5677 76.25 -11 -10.5677 72.5085 -11.0845 8.256
  [4,16,72.2585,-11.0845,8.256,76,-11,-10.5677,76.25,-11,-10.5677,72.5085,-11.0845,8.256],
// 4 16 76.25 11 -49 76 11 -49 76 11 -13.0658 76.25 11 -13.0658
  [4,16,76.25,11,-49,76,11,-49,76,11,-13.0658,76.25,11,-13.0658],
// 4 16 76.25 11 -13.0658 76 11 -13.0658 71.8435 10.9226 8.188 72.0935 10.9226 8.188
  [4,16,76.25,11,-13.0658,76,11,-13.0658,71.8435,10.9226,8.188,72.0935,10.9226,8.188],
// 4 16 71.8435 10.9226 8.188 72.2585 -11.0845 8.256 72.5085 -11.0845 8.256 72.0935 10.9226 8.188
  [4,16,71.8435,10.9226,8.188,72.2585,-11.0845,8.256,72.5085,-11.0845,8.256,72.0935,10.9226,8.188],
// 5 24 76.25 11 -13.0658 76.25 -11 -10.5677 76.25 -11 -49 72.5085 -11.0845 8.256
  [5,24,76.25,11,-13.0658,76.25,-11,-10.5677,76.25,-11,-49,72.5085,-11.0845,8.256],
// 5 24 76 -11 -10.5677 76 11 -13.0658 71.8435 10.9226 8.188 76 11 -49
  [5,24,76,-11,-10.5677,76,11,-13.0658,71.8435,10.9226,8.188,76,11,-49],
];
module ldraw_lib__194295bc01(step=0, col=false, unit=2/5, alt=false, line=0.2, solid=!$preview)
    makepoly(ldraw_lib__194295bc01(), step=step, col=col, unit=unit, alt=alt, line=line, solid=solid);
ldraw_lib__194295bc01(line=0.2);
